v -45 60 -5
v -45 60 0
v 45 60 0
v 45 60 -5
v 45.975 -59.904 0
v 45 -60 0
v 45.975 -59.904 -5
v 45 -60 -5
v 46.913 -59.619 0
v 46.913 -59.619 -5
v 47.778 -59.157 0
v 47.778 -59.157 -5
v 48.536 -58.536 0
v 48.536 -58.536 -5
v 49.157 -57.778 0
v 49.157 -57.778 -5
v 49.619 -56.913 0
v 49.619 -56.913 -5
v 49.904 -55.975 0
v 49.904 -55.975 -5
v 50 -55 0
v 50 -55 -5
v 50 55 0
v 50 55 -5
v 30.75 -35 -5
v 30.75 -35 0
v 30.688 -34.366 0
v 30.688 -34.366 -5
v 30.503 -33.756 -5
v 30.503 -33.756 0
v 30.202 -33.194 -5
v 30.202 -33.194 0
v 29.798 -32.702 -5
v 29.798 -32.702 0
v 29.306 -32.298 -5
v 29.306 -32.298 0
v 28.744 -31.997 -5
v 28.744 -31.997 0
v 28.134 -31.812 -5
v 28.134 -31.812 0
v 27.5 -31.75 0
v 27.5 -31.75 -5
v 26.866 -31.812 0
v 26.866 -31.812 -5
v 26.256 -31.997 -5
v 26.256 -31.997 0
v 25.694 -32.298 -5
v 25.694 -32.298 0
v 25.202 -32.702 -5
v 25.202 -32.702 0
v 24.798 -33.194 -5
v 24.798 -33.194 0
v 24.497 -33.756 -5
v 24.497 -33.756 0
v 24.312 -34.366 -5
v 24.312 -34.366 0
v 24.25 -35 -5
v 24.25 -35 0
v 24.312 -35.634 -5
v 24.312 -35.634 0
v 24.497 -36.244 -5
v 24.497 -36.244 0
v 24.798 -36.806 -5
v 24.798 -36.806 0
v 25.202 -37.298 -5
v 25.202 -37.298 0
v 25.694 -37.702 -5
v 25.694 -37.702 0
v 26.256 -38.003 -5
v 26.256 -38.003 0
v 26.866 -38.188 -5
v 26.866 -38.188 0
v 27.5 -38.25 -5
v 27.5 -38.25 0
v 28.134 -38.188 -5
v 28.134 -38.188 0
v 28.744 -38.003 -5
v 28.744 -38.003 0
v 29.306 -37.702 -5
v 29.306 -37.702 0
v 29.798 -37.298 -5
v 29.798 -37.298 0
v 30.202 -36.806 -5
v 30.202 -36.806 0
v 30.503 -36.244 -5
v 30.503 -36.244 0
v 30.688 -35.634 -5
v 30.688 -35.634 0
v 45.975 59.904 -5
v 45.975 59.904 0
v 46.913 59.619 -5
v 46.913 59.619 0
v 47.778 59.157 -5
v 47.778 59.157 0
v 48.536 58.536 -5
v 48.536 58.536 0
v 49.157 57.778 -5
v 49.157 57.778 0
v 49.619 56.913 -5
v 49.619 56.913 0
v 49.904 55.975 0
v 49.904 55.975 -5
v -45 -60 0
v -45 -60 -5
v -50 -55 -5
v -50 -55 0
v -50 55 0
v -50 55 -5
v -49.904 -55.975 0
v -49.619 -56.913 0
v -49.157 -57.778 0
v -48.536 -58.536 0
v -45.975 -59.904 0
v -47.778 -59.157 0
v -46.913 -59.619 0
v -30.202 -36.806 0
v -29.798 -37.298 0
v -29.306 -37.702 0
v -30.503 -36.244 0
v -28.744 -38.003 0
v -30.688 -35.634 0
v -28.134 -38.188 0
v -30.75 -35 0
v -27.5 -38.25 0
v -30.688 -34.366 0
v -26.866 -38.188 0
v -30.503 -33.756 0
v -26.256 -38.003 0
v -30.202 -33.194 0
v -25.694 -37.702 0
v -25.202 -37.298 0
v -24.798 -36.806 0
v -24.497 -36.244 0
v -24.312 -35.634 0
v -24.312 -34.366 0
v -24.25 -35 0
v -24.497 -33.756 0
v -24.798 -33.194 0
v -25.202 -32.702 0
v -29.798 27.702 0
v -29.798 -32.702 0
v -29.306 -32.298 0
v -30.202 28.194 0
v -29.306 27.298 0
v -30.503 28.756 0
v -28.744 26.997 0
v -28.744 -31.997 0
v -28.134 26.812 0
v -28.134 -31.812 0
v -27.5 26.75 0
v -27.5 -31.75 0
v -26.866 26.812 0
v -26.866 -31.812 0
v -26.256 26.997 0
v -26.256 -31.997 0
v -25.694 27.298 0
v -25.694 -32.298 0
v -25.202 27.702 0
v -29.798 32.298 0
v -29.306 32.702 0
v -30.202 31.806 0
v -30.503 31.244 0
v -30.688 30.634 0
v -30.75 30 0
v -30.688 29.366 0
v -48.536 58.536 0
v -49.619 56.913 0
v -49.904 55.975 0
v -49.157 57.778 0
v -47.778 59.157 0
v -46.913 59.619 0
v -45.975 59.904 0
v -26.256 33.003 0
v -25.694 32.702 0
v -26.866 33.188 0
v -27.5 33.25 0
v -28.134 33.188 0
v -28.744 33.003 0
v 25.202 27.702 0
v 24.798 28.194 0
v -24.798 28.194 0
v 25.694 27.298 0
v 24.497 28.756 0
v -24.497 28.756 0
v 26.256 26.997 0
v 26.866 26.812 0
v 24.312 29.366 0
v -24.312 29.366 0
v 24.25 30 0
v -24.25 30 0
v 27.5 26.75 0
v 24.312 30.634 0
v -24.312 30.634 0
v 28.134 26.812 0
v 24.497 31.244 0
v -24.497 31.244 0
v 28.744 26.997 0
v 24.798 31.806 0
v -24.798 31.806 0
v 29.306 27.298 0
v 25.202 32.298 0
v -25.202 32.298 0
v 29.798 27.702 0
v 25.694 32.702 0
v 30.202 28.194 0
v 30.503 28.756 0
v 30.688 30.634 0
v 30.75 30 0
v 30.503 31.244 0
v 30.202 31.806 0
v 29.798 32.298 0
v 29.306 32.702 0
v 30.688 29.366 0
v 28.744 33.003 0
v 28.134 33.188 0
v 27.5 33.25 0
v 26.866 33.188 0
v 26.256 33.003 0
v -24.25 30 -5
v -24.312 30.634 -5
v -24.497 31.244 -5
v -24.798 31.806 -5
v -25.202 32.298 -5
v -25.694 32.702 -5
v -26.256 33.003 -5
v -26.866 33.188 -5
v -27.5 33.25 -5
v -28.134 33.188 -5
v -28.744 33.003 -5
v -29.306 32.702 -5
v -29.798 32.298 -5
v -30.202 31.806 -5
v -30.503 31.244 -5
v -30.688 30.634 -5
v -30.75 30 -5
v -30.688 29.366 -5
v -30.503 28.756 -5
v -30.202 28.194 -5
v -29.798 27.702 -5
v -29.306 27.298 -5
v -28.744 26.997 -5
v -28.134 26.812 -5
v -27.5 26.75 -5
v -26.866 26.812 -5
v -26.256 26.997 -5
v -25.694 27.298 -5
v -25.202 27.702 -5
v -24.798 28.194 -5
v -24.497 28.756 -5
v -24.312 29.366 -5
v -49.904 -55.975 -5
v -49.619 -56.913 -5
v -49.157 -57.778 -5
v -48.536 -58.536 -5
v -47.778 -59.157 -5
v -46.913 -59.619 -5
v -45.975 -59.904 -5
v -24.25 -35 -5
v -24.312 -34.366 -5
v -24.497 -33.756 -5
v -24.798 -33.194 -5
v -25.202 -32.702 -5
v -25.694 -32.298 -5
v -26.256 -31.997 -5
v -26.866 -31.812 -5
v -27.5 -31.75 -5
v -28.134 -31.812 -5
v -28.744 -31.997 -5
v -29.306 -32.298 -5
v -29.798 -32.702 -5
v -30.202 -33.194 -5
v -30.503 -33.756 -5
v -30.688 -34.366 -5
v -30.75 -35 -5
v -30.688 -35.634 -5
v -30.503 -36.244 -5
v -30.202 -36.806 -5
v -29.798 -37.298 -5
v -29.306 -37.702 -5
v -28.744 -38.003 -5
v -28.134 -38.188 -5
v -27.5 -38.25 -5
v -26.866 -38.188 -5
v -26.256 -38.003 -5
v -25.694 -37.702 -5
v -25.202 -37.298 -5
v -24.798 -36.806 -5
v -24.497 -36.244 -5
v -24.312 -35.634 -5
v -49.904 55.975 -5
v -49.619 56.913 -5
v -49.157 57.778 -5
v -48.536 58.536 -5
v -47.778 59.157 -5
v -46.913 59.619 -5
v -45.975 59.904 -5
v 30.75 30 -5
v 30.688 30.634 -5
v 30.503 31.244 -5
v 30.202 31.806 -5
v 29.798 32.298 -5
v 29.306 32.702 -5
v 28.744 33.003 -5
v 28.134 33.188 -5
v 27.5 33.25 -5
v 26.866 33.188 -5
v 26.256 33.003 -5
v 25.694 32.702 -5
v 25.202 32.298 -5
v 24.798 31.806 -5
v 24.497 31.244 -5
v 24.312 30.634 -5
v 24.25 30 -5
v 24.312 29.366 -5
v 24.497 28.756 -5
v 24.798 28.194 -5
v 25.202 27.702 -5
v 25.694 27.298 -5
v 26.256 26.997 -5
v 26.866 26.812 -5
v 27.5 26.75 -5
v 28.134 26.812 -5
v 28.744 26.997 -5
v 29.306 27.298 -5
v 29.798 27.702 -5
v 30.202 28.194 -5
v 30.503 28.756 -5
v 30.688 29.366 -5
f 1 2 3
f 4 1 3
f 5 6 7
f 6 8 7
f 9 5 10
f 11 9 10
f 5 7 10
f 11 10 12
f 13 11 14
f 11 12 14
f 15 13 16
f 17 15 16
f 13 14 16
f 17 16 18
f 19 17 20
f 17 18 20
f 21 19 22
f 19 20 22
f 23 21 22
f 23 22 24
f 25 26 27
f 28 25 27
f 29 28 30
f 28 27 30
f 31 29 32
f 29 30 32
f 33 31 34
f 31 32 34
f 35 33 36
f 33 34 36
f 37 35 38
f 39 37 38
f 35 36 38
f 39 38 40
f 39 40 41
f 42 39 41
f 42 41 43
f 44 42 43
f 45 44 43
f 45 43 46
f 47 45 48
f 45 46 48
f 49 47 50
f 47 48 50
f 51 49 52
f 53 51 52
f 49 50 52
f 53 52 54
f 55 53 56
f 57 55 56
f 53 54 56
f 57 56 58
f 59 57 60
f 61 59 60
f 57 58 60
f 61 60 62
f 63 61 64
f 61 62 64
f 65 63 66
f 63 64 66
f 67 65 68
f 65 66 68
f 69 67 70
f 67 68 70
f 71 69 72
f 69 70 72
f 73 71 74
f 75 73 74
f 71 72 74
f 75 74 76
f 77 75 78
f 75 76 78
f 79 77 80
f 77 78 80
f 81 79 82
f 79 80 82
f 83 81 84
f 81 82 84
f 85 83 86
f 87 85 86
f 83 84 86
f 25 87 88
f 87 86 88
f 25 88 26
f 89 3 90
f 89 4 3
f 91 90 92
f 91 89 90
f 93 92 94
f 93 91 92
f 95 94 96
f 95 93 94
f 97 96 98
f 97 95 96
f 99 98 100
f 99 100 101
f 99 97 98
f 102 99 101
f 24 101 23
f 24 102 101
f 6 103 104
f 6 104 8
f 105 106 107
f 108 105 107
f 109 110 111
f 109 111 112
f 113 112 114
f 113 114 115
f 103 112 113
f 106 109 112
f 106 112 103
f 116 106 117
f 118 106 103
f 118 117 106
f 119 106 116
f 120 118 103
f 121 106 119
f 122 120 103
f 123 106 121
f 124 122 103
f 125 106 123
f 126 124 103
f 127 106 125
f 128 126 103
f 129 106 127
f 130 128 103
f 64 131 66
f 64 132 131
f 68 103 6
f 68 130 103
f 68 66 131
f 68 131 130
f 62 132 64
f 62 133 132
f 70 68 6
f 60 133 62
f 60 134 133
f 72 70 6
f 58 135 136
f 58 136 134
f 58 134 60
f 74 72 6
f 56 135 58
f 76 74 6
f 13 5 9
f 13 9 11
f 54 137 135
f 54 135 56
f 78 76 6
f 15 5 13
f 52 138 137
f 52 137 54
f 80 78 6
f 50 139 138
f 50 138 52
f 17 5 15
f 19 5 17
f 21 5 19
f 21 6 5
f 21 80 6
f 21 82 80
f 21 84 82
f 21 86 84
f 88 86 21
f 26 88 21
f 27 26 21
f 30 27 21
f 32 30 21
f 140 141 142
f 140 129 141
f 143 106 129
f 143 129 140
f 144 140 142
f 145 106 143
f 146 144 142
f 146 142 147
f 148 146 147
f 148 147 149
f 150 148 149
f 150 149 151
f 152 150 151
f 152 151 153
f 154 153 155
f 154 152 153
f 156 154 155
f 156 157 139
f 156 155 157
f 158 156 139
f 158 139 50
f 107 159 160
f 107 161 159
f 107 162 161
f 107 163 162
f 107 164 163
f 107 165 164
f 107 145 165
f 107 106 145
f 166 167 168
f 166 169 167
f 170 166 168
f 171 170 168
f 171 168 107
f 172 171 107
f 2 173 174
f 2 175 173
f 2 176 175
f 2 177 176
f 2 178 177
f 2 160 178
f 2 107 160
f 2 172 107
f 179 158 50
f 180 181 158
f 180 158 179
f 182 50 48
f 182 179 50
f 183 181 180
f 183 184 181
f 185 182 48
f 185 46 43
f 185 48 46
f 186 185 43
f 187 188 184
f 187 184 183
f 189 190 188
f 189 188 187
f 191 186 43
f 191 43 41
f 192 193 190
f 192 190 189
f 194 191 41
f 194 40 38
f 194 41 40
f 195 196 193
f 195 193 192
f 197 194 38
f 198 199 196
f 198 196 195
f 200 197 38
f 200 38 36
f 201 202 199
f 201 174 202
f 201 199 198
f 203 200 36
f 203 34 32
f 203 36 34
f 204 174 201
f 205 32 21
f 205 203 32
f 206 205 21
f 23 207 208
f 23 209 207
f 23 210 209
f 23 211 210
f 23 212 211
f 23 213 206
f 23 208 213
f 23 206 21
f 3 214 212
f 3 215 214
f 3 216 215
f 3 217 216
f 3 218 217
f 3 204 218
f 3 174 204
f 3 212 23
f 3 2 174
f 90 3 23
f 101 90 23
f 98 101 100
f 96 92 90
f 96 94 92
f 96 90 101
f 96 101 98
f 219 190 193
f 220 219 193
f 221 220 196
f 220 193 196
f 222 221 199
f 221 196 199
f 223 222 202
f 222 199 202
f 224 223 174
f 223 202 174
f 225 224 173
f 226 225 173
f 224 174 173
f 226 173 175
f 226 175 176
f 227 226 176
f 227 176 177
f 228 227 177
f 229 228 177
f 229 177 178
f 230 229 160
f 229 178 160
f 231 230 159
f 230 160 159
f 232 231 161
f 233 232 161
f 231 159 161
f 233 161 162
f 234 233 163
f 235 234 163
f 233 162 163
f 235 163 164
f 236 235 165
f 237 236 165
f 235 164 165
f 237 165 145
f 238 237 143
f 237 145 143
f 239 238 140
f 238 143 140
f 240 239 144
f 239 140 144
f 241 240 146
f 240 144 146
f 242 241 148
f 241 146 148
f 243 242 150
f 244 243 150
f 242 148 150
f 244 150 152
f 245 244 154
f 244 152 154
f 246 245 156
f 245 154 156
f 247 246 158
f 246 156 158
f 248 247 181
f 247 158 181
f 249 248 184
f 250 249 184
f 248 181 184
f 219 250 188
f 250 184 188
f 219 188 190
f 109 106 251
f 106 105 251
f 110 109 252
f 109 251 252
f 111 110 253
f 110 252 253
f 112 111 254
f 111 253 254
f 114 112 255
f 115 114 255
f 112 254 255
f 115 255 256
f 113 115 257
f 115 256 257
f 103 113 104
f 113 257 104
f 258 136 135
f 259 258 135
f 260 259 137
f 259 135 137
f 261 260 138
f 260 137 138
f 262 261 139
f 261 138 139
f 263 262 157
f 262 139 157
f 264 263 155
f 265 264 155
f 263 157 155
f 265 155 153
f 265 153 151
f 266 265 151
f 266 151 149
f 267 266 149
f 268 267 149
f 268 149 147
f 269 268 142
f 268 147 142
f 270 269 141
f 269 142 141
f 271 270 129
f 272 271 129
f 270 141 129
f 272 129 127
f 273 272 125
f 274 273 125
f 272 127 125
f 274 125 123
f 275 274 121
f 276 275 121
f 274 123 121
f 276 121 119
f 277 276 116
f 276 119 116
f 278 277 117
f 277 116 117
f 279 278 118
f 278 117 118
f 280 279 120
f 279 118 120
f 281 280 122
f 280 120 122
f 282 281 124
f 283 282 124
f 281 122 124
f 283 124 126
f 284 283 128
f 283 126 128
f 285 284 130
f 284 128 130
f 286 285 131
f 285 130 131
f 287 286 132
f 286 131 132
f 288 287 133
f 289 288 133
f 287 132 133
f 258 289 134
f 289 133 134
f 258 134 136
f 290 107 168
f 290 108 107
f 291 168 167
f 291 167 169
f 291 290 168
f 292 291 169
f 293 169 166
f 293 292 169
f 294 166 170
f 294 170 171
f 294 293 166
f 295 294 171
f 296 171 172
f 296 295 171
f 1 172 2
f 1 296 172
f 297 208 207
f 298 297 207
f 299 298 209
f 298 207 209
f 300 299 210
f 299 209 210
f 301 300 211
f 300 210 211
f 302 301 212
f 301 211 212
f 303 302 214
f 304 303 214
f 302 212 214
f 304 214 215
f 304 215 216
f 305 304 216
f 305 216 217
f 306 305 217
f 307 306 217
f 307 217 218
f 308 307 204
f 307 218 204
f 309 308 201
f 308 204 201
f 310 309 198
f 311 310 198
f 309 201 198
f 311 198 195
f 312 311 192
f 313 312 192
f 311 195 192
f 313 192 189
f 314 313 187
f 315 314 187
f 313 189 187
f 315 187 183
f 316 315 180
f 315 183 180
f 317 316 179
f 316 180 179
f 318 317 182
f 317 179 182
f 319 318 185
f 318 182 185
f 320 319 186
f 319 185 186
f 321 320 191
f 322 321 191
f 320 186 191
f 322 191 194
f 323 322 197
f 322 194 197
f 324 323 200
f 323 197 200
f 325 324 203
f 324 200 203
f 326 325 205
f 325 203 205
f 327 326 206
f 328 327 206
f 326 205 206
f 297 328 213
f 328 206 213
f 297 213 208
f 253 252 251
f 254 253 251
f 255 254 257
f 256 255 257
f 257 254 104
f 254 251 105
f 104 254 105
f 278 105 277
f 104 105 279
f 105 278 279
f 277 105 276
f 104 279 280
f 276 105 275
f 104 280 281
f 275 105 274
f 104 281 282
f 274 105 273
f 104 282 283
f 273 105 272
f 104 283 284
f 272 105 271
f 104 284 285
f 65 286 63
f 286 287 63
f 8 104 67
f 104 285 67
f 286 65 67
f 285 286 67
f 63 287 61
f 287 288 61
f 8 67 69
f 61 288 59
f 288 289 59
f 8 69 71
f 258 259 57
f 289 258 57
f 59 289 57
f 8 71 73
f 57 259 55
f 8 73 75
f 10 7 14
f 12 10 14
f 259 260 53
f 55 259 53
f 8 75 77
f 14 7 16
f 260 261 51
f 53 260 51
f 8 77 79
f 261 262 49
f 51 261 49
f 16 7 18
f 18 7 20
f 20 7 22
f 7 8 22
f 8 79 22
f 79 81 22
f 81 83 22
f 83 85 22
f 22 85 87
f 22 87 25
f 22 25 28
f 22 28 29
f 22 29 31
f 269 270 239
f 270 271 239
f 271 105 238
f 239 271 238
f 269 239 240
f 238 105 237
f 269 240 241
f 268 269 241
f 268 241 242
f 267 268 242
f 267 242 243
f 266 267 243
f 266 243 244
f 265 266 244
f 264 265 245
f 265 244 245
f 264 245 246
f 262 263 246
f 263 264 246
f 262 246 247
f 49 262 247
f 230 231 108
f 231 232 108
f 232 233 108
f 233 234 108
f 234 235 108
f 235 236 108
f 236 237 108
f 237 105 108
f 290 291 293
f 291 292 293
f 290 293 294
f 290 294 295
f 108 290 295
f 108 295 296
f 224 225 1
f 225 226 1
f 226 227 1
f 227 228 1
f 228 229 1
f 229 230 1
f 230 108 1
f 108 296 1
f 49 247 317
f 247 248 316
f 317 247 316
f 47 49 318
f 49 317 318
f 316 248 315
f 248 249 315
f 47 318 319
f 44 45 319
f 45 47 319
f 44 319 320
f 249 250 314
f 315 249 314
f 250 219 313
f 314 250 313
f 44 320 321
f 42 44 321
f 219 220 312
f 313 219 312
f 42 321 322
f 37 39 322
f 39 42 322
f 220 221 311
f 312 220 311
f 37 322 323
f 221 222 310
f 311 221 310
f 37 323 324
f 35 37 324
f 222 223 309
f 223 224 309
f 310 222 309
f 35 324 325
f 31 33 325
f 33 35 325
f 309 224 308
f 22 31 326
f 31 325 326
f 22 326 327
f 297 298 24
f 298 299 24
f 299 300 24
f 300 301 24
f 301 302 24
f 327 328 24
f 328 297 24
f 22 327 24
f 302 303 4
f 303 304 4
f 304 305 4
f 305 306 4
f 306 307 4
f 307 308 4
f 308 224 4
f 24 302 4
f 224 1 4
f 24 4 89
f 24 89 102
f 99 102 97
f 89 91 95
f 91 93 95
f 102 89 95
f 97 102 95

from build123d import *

# Parameters (mm, degrees)
SKETCH1_W          = 100
SKETCH1_H          = 120
SKETCH1_R          = 3.25
BASE_FLANGE1_DEPTH = 5
FILLET1_R          = 5


# Sheet-metal steps are written as plain solids
with BuildPart() as part:
    # Sketch1 → Base-Flange1 (new body)
    with BuildSketch(Plane.XY):
        Rectangle(SKETCH1_W, SKETCH1_H)
        with Locations((-27.5, 30)):
            Circle(SKETCH1_R, mode=Mode.SUBTRACT)
        with Locations((27.5, 30)):
            Circle(SKETCH1_R, mode=Mode.SUBTRACT)
        with Locations((-27.5, -35)):
            Circle(SKETCH1_R, mode=Mode.SUBTRACT)
        with Locations((27.5, -35)):
            Circle(SKETCH1_R, mode=Mode.SUBTRACT)
    extrude(amount=-BASE_FLANGE1_DEPTH)

    # Fillet1
    fillet1_edges = [part.edges().sort_by_distance(p)[0] for p in [
        (50, -60, -2.5),
        (-50, -60, -2.5),
        (-50, 60, -2.5),
        (50, 60, -2.5),
    ]]
    fillet(fillet1_edges, radius=FILLET1_R)


solid = part.part
